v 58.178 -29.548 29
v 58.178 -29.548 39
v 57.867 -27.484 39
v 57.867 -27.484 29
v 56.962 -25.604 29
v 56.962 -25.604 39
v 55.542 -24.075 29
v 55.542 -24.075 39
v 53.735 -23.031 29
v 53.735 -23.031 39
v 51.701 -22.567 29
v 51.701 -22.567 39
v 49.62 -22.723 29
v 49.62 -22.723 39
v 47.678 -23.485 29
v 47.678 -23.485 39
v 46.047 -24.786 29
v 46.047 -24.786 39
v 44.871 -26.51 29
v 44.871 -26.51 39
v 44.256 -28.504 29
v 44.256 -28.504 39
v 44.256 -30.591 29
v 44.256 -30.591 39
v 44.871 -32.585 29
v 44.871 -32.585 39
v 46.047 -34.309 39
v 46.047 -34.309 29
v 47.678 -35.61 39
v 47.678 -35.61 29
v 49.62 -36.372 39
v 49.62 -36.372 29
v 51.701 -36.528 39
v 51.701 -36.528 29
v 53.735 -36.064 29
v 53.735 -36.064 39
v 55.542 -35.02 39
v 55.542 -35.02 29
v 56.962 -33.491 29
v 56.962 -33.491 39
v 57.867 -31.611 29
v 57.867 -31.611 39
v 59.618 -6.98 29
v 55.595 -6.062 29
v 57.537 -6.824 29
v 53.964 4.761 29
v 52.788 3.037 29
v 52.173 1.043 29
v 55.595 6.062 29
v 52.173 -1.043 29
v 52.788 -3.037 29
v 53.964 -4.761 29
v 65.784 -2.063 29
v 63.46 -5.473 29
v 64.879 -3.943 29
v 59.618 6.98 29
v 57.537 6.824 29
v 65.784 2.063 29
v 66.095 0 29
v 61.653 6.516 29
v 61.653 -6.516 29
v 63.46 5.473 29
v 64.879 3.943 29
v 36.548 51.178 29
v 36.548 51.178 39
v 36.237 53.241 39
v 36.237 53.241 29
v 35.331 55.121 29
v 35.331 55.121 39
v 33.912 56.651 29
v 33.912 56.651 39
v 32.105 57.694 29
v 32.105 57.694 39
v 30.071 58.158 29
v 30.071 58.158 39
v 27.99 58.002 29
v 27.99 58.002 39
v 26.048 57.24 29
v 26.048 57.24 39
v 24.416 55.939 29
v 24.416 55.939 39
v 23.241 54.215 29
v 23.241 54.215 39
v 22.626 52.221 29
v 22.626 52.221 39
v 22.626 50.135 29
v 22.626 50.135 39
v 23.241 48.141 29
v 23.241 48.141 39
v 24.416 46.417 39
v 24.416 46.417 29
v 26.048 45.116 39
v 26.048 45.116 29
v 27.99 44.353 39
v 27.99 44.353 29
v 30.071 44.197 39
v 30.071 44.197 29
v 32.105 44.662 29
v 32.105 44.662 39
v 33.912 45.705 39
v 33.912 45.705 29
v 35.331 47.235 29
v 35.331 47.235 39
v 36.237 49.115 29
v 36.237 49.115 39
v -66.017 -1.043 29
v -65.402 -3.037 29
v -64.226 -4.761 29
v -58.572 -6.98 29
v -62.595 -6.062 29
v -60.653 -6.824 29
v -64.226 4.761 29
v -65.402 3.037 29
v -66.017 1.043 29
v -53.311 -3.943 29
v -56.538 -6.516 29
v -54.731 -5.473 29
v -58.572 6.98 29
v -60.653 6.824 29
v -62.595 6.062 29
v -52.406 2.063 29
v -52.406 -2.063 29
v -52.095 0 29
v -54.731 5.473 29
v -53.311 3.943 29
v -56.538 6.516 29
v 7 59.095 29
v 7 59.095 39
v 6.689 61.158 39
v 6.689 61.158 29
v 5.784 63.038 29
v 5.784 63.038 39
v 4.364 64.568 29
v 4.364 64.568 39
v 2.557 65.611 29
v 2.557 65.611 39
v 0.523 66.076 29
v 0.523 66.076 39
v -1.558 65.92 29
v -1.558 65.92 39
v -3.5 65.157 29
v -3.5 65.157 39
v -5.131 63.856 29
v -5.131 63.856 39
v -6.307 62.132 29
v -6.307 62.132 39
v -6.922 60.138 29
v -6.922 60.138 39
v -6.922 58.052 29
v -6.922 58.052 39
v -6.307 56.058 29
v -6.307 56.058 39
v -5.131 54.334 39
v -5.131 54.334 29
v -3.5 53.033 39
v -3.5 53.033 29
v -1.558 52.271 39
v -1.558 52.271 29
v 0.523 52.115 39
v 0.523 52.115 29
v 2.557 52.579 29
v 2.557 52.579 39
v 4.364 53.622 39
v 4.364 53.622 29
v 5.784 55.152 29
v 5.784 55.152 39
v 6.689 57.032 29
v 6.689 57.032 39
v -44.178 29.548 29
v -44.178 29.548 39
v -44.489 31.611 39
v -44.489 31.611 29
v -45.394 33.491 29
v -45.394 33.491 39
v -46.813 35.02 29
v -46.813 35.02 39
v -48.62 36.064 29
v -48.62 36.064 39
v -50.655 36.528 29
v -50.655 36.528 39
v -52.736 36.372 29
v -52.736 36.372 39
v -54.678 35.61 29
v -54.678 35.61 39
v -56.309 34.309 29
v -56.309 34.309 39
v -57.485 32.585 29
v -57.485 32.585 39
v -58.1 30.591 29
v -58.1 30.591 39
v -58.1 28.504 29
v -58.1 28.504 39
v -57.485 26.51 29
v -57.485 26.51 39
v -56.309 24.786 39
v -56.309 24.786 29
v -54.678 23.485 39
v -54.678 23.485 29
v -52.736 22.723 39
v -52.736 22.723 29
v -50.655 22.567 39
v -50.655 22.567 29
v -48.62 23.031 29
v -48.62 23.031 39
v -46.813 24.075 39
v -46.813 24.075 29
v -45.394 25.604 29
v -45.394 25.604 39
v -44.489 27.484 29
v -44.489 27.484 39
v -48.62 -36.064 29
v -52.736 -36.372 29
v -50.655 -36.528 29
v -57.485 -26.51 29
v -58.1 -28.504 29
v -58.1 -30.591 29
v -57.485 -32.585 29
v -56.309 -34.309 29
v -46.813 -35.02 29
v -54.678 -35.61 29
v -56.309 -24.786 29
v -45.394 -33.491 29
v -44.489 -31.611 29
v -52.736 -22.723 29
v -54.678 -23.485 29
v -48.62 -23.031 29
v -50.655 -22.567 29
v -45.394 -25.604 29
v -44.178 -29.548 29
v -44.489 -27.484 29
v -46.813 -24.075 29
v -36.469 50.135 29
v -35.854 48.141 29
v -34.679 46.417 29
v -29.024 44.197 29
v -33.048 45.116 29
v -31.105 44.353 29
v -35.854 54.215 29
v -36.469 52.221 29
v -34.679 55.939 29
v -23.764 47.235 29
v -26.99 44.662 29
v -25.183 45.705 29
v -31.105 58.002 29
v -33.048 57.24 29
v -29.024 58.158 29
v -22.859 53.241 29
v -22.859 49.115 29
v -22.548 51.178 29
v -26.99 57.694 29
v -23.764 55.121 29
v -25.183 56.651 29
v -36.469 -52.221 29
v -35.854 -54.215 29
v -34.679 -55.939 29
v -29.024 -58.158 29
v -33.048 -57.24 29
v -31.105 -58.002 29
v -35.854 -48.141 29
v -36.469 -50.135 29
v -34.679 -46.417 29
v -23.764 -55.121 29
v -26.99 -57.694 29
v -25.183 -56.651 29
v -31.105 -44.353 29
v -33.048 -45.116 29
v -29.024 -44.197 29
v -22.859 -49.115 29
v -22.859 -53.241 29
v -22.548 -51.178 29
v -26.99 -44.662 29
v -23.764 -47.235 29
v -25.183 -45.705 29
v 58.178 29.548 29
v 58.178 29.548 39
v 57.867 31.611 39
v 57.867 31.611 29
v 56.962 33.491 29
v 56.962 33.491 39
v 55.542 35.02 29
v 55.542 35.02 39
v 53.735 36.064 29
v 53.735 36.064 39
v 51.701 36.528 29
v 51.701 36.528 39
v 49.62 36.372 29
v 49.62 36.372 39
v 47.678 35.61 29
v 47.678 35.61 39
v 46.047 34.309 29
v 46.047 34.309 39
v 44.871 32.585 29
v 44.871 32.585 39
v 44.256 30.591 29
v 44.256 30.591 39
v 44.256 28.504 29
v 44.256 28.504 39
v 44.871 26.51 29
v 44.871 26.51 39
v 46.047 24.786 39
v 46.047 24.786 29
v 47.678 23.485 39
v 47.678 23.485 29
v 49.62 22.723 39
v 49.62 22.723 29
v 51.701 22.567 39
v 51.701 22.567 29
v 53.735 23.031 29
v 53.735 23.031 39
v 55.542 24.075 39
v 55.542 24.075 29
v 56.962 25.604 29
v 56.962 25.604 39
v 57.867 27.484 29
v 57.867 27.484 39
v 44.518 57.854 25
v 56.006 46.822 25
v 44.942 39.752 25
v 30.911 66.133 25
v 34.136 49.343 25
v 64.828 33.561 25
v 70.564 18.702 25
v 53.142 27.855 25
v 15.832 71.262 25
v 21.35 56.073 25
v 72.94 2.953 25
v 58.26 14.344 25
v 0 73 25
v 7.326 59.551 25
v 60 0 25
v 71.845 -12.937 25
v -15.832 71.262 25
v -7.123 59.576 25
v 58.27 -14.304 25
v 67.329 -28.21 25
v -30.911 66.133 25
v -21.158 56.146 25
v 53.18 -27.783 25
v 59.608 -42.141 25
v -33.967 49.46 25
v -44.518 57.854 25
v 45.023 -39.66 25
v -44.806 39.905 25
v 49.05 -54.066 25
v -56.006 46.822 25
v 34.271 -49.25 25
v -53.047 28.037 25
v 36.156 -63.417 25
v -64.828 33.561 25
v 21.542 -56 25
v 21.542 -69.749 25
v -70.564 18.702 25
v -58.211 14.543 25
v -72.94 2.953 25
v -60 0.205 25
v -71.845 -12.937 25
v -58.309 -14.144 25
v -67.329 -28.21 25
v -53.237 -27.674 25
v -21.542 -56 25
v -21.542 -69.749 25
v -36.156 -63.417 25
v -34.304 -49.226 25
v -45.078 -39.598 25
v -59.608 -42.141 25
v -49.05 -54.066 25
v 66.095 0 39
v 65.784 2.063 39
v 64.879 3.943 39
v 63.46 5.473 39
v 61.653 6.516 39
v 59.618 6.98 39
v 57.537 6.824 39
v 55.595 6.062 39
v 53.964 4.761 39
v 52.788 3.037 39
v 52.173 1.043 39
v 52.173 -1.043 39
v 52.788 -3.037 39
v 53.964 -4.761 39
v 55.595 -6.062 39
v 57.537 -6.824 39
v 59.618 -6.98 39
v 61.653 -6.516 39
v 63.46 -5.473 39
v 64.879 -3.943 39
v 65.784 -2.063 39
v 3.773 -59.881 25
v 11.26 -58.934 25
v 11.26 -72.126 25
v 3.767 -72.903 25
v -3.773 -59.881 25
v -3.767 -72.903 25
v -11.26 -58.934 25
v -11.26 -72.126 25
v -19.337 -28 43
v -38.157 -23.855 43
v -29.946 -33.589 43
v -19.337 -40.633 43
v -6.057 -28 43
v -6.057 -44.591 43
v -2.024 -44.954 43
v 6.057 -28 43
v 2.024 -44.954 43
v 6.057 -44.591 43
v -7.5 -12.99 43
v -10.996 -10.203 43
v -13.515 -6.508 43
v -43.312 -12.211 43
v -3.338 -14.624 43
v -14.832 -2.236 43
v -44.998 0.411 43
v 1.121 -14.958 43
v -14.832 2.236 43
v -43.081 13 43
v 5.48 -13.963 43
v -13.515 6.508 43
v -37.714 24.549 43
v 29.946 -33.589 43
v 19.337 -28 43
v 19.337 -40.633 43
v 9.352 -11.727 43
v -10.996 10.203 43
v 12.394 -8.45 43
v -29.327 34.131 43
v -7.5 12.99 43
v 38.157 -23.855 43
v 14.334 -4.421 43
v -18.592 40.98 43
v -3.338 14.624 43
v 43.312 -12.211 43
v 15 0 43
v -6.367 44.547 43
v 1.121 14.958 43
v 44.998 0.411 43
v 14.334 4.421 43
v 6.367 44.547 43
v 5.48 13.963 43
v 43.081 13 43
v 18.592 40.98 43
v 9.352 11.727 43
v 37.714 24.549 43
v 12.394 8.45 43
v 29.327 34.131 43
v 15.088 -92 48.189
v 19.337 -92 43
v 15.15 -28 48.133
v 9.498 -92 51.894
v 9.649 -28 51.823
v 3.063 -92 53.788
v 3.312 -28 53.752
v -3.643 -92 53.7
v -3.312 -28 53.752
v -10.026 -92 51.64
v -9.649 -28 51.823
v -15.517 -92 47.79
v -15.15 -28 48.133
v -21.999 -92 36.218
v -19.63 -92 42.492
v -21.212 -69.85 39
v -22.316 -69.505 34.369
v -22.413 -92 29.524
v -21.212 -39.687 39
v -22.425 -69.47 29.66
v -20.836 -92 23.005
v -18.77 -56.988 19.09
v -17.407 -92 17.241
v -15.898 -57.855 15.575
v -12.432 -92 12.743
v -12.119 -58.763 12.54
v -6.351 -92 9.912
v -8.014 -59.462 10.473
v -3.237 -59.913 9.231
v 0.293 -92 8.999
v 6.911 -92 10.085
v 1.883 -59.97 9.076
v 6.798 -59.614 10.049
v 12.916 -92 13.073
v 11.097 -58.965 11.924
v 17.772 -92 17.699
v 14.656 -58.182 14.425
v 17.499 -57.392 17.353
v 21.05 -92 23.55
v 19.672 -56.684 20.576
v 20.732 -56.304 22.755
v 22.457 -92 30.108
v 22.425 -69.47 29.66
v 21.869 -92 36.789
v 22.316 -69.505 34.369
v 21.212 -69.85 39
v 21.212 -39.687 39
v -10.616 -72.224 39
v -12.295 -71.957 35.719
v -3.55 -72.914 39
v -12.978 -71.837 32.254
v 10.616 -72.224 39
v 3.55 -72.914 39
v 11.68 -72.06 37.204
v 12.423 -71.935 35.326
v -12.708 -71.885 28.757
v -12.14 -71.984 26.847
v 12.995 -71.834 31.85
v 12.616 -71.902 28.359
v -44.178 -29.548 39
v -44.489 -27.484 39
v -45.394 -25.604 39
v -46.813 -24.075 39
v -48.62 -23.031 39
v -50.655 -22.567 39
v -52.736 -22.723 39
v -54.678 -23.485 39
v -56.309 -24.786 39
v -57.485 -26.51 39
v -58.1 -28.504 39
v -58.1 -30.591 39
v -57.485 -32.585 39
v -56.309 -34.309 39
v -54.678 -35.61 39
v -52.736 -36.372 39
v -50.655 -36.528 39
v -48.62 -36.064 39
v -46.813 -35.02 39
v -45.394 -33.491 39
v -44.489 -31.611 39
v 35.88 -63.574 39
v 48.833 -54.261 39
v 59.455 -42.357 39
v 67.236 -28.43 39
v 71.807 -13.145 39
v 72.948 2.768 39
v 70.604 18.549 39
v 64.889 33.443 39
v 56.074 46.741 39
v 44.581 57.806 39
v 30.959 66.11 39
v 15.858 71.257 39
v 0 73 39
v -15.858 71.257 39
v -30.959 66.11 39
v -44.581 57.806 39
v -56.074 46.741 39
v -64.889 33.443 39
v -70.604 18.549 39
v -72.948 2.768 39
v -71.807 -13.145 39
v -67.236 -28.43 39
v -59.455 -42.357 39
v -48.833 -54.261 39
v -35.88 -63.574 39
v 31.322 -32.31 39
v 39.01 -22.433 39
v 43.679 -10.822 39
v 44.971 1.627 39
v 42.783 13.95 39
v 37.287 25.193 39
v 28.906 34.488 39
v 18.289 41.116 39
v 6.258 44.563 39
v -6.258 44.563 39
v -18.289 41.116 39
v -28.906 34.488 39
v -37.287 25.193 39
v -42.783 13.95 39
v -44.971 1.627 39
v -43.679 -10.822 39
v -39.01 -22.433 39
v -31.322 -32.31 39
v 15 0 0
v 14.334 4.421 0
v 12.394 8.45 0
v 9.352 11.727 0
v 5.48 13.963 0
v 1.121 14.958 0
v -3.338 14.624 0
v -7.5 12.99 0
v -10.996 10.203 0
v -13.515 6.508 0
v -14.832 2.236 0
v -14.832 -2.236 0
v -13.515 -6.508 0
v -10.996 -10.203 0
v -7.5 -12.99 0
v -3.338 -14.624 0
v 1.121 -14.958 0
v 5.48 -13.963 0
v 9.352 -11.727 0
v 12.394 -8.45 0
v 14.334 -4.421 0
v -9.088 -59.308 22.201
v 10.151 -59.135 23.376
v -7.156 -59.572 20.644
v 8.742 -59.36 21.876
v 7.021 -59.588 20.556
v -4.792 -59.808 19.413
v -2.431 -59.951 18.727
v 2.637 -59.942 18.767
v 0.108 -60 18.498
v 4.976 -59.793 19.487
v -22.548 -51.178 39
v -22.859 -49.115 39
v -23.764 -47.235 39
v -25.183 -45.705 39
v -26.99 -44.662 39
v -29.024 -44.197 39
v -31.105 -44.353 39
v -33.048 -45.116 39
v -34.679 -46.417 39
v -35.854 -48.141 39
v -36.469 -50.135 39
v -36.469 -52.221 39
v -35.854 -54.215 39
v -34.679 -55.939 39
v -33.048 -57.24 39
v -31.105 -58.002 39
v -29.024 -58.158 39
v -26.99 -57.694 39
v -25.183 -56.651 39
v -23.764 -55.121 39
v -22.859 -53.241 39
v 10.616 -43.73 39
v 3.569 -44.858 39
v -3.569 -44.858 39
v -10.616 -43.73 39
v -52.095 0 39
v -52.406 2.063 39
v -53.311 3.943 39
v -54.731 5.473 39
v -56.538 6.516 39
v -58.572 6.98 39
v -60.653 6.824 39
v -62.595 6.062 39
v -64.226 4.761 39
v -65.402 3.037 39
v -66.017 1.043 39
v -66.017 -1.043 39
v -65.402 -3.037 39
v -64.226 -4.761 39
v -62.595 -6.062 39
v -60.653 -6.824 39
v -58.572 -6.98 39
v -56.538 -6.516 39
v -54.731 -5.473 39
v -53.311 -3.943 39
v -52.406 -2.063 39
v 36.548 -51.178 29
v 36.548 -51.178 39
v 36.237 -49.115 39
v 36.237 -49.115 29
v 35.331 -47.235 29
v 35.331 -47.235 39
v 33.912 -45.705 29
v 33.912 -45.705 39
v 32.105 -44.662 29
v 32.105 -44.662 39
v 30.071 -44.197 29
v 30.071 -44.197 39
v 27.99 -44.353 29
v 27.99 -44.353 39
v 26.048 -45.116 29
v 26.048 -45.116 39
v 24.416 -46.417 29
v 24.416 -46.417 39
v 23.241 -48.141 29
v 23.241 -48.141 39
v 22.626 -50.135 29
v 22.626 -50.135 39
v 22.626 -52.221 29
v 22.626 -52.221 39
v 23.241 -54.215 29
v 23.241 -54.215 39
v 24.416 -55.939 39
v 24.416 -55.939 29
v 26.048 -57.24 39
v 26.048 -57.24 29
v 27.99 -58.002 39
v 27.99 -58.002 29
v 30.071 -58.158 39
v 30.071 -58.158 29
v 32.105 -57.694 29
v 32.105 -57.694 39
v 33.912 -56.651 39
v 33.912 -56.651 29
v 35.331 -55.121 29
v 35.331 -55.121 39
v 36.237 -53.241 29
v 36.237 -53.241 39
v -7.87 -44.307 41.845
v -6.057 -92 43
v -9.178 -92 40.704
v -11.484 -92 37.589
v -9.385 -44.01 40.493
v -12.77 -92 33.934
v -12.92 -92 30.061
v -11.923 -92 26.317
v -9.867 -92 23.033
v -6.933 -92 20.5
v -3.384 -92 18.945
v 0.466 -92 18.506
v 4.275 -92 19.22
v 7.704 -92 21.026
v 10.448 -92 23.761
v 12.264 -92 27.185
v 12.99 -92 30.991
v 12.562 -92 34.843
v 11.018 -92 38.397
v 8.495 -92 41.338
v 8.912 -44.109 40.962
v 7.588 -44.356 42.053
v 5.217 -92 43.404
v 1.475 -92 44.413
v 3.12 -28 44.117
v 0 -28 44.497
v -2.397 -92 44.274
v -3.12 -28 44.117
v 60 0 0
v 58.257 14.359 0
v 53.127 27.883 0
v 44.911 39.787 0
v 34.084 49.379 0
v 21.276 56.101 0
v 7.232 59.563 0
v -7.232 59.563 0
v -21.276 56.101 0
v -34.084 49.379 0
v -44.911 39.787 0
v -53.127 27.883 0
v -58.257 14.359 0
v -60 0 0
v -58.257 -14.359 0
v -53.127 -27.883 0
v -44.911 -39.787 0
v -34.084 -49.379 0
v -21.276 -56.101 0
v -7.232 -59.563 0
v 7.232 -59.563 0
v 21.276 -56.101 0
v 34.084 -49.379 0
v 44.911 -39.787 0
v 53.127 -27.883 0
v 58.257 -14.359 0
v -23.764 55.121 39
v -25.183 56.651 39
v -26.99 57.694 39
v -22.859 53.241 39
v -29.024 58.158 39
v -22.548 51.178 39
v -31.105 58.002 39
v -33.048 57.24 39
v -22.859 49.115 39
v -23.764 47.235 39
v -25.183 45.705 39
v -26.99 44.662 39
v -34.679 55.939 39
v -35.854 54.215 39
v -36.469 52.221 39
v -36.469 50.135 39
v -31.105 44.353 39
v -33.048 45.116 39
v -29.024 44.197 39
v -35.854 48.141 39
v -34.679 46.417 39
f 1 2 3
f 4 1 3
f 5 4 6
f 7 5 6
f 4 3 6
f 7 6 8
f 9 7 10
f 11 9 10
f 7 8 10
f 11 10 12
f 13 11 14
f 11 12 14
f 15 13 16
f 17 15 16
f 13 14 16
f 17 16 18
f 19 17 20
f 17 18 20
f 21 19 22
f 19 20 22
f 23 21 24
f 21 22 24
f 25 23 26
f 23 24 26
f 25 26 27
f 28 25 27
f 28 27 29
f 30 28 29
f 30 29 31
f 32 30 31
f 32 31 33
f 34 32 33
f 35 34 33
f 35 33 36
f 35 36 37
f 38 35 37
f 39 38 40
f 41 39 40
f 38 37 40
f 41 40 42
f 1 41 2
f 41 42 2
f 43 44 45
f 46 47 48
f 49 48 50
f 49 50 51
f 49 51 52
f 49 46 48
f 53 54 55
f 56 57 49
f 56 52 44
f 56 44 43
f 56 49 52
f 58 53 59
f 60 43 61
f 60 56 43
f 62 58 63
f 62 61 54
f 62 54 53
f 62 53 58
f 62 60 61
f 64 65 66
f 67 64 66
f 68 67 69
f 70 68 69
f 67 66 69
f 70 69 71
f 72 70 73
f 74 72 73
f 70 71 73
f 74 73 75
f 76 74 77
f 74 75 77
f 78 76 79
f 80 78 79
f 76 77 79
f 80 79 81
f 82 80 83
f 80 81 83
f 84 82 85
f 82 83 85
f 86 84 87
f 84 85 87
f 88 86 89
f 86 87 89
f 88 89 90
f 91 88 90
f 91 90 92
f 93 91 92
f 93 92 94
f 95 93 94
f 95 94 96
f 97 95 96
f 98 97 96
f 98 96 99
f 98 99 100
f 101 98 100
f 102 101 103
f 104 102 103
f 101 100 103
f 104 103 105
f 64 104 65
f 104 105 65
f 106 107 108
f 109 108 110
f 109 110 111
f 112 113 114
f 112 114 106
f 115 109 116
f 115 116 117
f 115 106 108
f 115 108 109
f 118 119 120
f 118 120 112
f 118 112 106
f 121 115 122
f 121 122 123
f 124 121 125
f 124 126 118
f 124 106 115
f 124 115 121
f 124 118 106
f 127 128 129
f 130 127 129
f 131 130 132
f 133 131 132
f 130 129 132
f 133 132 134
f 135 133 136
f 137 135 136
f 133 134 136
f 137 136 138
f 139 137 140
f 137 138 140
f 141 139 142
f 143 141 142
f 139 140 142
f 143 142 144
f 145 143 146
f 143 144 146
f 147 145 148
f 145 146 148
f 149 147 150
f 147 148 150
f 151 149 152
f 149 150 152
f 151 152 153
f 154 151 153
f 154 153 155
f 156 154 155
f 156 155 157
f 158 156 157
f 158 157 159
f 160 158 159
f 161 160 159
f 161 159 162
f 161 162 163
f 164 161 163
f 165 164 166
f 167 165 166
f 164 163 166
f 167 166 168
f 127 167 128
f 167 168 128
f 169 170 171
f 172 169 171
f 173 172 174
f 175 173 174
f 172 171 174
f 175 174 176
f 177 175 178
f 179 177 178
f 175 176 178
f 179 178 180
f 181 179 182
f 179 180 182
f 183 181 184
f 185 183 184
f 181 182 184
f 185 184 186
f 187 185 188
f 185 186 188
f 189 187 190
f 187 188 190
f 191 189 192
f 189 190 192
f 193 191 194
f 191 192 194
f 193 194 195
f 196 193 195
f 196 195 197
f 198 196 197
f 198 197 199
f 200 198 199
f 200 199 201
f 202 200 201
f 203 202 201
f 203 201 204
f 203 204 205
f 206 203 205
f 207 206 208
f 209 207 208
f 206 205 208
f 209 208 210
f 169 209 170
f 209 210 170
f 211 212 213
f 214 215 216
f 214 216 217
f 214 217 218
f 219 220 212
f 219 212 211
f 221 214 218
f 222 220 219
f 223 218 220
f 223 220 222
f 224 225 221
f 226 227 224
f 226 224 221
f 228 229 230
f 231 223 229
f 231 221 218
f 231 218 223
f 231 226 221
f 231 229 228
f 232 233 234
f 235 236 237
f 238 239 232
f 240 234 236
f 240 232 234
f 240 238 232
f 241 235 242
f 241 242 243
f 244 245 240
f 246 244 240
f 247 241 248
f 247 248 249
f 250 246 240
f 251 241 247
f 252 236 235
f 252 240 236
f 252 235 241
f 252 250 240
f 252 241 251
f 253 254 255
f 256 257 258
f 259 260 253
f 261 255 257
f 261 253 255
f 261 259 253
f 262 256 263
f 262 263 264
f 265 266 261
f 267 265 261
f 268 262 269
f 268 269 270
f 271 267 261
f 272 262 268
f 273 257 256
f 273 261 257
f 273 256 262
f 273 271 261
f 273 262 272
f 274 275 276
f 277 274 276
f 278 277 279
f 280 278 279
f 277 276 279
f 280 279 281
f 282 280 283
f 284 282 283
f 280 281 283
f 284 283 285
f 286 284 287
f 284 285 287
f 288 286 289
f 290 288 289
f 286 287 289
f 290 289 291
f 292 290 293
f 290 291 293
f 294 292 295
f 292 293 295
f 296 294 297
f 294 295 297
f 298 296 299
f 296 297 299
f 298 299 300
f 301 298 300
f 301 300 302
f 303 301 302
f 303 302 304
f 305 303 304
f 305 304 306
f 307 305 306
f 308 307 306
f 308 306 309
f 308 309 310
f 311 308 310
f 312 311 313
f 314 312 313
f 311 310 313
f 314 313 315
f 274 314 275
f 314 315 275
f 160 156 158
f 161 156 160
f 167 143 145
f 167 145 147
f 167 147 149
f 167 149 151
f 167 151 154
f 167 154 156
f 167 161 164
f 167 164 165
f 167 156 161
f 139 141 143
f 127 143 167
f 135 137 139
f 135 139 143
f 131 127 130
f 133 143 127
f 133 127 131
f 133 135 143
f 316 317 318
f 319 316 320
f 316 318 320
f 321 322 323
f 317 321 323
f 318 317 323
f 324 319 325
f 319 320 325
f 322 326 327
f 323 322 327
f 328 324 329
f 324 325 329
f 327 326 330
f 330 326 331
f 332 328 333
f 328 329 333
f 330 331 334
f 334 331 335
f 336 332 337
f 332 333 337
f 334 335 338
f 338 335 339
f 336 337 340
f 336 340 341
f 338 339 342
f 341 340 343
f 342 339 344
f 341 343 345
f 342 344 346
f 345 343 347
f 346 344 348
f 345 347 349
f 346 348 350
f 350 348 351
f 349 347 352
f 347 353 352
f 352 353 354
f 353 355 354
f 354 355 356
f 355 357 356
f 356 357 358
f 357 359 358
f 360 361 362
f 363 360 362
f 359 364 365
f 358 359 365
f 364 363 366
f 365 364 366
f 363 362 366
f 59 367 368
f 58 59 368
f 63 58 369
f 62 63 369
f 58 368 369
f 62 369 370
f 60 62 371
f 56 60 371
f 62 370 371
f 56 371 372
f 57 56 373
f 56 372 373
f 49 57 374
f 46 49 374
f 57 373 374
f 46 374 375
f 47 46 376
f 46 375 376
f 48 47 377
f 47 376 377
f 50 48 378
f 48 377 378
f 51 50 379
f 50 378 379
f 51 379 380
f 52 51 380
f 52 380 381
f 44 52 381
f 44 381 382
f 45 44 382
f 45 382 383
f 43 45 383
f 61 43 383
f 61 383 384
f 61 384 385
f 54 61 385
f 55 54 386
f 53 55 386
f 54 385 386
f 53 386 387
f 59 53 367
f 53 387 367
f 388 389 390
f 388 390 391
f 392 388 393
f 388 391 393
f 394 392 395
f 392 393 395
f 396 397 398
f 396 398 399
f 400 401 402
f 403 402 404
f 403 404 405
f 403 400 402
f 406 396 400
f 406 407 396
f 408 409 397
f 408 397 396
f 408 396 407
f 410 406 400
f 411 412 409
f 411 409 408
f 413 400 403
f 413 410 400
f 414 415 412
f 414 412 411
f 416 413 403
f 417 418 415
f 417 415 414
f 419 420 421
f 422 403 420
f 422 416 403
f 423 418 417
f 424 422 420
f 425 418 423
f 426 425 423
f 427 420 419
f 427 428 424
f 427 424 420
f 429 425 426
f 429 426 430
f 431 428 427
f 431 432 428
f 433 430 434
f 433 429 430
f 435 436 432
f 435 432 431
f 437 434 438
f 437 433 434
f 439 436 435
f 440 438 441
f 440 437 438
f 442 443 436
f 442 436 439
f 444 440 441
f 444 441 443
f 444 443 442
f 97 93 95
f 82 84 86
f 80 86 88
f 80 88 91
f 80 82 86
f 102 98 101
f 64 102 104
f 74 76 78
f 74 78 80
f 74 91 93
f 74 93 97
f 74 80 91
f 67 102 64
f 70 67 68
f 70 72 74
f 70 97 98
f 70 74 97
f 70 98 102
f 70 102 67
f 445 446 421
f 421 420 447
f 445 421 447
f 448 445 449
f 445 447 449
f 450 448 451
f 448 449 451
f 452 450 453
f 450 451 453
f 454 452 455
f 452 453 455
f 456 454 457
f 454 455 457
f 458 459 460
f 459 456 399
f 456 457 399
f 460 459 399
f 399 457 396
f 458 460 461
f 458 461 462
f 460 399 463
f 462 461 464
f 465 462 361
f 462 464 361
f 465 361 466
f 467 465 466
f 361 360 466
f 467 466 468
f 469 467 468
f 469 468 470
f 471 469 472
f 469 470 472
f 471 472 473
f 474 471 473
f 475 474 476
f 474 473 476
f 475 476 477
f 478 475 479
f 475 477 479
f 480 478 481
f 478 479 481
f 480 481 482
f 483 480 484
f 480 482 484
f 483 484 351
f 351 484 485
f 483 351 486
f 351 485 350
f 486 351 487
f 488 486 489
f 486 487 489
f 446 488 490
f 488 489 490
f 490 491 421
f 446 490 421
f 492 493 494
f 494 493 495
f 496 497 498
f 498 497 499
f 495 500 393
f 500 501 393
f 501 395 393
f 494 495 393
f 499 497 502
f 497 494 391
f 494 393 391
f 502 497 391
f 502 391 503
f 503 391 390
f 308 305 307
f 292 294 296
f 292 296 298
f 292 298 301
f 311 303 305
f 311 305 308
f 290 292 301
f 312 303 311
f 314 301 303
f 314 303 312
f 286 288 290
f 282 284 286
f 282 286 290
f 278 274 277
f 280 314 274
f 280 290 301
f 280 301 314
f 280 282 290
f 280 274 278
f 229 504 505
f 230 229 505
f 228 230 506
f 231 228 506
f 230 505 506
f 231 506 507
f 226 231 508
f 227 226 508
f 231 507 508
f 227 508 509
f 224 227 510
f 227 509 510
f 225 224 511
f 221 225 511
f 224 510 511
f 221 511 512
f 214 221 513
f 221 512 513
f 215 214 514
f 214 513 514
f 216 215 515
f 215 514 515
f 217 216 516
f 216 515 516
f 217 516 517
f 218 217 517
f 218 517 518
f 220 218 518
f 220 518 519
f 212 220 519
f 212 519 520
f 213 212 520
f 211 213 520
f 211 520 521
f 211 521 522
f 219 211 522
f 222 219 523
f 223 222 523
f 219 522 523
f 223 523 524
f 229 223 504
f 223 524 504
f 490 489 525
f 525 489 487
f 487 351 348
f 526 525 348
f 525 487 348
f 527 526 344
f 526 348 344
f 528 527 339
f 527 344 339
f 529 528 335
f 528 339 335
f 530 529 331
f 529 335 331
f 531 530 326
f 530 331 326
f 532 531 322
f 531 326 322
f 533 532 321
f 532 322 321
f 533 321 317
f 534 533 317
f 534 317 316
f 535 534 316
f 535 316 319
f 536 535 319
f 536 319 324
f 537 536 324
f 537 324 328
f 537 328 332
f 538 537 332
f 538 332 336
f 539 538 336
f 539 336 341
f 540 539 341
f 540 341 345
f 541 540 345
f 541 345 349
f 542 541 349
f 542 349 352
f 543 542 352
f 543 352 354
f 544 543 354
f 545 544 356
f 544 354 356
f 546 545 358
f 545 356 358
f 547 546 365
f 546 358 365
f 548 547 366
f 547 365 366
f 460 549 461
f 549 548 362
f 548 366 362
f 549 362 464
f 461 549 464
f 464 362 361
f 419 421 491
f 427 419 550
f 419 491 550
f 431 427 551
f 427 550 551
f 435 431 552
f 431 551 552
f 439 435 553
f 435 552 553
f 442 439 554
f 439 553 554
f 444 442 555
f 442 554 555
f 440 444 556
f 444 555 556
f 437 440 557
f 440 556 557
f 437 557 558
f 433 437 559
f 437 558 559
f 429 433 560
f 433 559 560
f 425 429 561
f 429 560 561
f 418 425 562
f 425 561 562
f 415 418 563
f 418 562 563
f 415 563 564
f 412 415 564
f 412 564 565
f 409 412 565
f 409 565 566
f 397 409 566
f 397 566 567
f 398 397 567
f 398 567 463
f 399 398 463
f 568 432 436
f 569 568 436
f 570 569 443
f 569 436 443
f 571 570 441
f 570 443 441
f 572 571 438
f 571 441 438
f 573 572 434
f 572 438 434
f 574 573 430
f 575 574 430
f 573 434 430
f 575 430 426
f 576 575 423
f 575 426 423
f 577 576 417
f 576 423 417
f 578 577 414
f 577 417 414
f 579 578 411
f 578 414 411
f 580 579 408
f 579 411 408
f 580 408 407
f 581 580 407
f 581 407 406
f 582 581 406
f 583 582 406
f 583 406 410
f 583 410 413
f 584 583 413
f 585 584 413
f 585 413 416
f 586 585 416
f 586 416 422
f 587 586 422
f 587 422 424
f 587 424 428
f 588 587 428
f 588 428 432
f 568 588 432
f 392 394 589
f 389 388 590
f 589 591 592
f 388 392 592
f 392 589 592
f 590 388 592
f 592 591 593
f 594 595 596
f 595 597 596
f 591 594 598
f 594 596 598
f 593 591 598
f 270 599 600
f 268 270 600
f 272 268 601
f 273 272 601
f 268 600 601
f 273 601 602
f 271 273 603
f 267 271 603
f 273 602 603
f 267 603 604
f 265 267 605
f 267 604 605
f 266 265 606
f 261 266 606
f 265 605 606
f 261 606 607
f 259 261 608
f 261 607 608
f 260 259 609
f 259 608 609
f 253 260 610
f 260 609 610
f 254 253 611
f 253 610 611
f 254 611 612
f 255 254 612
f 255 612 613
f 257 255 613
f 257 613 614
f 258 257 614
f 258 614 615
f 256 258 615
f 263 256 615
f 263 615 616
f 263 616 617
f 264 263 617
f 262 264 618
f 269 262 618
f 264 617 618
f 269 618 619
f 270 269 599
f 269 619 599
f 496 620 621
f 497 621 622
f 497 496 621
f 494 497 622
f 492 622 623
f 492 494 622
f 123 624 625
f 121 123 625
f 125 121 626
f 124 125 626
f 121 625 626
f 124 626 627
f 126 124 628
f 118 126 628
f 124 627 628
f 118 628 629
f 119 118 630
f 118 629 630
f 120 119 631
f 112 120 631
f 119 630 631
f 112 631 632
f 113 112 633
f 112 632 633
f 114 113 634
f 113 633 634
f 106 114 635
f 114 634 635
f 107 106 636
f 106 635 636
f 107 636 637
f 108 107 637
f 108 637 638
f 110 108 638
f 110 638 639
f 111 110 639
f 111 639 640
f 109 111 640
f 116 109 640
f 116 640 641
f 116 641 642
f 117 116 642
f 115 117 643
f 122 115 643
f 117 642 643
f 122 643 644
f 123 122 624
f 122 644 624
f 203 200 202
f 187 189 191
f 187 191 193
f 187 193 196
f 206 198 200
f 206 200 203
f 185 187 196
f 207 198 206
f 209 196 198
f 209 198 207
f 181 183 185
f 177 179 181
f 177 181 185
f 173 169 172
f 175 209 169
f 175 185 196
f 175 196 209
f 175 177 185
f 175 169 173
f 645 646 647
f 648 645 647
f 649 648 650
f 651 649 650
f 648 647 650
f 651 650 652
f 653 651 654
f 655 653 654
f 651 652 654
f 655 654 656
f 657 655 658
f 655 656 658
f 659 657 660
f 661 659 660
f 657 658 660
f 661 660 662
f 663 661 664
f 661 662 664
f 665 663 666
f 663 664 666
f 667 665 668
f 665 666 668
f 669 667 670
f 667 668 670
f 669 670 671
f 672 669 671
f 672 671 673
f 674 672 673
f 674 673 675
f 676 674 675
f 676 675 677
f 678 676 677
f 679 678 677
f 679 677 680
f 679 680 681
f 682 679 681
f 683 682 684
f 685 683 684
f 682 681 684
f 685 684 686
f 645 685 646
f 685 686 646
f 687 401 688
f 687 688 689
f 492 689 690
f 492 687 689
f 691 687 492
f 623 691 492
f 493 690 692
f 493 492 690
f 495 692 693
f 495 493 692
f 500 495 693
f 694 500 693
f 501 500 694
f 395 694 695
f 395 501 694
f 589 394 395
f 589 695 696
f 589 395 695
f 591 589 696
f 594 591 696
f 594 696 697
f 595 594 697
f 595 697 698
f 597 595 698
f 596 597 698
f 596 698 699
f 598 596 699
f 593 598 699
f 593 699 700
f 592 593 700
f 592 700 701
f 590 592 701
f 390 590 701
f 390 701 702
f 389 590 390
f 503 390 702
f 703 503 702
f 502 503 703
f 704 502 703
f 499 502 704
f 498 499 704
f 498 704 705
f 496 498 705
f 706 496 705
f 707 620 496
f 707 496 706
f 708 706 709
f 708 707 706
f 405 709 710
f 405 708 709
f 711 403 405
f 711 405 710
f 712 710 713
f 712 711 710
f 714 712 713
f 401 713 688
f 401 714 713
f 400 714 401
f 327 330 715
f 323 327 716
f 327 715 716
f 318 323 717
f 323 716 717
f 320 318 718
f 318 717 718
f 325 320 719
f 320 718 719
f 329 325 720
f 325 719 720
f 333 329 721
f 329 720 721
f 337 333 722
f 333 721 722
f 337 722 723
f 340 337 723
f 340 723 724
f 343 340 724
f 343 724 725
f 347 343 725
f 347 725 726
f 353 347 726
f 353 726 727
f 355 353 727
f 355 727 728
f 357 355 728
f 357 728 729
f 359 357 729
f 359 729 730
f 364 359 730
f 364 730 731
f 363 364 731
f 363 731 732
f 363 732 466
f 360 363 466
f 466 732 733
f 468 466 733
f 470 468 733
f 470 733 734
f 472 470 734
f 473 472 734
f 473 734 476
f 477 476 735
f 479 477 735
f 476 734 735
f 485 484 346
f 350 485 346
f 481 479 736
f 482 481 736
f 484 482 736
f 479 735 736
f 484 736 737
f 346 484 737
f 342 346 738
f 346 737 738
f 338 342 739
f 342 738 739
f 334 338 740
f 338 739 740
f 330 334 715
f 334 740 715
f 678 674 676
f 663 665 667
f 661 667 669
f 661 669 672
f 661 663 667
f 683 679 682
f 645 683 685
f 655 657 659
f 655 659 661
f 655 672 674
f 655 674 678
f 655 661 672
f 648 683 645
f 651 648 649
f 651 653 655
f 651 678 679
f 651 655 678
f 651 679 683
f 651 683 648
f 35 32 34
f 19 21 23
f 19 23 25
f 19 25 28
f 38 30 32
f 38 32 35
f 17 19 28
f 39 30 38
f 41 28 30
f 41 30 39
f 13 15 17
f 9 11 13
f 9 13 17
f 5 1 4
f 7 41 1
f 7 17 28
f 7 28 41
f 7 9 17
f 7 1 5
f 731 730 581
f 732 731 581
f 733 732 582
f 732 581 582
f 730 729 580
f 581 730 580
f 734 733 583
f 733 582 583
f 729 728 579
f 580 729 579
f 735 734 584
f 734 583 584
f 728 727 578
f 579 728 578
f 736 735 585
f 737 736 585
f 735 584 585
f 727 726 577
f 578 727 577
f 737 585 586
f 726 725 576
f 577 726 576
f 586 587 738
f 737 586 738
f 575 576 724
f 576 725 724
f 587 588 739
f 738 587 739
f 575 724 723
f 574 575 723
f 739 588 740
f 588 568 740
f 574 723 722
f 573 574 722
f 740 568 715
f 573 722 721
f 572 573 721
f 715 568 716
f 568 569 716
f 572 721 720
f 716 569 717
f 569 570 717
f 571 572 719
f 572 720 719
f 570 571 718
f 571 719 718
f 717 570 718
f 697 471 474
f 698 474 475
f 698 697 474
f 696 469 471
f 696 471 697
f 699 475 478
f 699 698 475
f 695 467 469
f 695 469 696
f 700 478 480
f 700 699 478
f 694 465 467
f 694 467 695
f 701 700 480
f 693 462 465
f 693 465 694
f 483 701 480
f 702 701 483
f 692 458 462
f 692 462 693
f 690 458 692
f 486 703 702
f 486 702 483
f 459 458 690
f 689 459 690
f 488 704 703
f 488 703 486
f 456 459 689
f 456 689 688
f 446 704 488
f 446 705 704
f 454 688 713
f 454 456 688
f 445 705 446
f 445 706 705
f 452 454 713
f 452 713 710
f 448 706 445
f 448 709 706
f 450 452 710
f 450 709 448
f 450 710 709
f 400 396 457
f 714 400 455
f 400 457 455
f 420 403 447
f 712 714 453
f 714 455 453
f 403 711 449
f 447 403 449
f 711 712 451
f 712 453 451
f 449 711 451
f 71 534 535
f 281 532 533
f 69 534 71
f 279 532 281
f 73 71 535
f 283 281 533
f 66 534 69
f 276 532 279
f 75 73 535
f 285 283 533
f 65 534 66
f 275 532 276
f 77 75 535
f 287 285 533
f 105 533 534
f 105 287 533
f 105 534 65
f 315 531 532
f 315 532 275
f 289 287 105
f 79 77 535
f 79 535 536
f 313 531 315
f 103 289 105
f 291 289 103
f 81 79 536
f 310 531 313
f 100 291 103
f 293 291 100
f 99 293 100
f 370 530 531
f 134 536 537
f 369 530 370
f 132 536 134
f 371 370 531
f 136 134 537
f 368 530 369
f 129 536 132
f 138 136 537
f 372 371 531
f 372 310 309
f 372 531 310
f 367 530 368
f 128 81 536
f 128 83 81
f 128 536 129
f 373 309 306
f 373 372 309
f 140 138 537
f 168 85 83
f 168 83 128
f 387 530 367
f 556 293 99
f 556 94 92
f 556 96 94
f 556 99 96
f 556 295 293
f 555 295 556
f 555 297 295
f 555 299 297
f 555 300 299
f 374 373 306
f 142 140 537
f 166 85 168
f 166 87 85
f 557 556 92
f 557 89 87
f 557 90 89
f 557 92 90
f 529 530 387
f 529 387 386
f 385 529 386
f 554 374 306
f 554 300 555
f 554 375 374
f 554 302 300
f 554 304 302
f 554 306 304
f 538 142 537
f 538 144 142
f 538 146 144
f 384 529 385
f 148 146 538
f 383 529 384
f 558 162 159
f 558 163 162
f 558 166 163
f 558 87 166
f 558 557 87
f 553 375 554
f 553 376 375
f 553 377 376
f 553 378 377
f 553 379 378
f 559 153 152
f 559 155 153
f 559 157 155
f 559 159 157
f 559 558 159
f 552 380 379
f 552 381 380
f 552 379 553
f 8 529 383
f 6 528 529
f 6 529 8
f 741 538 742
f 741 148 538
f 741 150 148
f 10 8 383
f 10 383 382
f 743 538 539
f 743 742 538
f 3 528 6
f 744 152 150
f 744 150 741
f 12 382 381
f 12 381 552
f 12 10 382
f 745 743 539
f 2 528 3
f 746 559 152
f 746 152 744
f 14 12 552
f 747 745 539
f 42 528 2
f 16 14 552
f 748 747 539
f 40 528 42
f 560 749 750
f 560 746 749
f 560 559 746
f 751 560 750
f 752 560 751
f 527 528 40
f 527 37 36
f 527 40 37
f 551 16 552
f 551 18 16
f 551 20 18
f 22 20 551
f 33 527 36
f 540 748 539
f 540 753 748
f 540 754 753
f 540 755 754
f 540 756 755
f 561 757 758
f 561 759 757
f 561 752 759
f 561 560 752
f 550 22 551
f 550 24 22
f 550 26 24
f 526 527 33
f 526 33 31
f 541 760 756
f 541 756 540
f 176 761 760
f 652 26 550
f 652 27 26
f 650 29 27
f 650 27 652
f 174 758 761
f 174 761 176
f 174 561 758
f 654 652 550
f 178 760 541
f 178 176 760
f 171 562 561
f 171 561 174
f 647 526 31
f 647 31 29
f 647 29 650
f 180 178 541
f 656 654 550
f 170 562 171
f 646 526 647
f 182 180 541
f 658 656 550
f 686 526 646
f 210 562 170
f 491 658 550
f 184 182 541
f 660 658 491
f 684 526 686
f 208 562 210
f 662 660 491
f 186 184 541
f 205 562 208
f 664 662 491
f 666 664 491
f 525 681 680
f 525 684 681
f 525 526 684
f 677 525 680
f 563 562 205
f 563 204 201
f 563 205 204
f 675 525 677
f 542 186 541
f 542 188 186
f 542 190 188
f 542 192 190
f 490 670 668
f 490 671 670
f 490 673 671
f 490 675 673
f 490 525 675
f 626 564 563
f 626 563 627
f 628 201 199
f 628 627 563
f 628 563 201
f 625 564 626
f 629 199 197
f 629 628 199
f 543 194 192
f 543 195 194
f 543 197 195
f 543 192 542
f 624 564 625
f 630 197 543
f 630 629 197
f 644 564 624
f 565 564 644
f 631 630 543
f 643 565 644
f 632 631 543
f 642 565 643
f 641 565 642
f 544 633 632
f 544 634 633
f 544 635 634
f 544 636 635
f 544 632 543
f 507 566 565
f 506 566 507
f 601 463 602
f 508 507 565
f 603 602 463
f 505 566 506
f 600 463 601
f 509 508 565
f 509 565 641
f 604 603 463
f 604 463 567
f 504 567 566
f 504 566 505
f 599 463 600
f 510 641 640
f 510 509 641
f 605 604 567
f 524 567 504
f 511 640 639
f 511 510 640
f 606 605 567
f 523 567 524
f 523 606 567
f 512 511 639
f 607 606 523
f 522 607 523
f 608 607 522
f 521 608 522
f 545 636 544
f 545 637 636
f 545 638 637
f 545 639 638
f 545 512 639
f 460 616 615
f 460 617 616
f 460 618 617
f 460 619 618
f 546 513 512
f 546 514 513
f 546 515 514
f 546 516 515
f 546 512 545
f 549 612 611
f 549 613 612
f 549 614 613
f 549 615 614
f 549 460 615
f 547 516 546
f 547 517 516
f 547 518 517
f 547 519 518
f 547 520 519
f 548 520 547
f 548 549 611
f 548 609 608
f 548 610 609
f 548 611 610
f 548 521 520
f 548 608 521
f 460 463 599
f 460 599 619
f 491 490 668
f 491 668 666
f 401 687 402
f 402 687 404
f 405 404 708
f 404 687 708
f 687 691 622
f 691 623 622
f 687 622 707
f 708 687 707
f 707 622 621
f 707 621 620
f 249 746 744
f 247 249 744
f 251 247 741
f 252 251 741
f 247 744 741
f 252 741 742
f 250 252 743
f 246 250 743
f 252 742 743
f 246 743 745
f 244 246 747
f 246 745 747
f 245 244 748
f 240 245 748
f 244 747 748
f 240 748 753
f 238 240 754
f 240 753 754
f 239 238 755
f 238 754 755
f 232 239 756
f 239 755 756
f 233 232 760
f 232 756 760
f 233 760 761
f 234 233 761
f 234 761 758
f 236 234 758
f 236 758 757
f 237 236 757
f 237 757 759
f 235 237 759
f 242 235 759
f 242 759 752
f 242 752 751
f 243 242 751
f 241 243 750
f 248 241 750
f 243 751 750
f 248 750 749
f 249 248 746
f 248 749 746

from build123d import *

# Parameters (mm, degrees)
SKETCH1_R                = 60
BOSS_EXTRUDE1_DEPTH      = 25
SKETCH2_R                = 73
BOSS_EXTRUDE2_DEPTH      = 14
SKETCH4_R                = 45
BOSS_EXTRUDE3_DEPTH      = 4
SKETCH5_R                = 15
CUT_EXTRUDE1_DEPTH       = 99
SKETCH6_R                = 7
CUT_EXTRUDE2_DEPTH       = 10
BOSS_EXTRUDE4_DEPTH      = 19
BOSS_EXTRUDE4_DEPTH_BACK = 45
SKETCH7_R                = 22.5
SKETCH7_R_2              = 13


with BuildPart() as part:
    # Sketch1 → Boss-Extrude1 (new body)
    with BuildSketch(Plane.XY):
        Circle(SKETCH1_R)
    extrude(amount=BOSS_EXTRUDE1_DEPTH)

    # Sketch2 → Boss-Extrude2 (add)
    with BuildSketch(Plane.XY.offset(25)):
        with Locations(Location((0, 0, 0), (0, 0, 180))):
            Circle(SKETCH2_R)
    extrude(amount=BOSS_EXTRUDE2_DEPTH)

    # Sketch4 → Boss-Extrude3 (add)
    with BuildSketch(Plane.XY.offset(39)):
        Circle(SKETCH4_R)
    extrude(amount=BOSS_EXTRUDE3_DEPTH)

    # Sketch5 → Cut-Extrude1 (cut)
    with BuildSketch(Plane.XY.offset(43)):
        Circle(SKETCH5_R)
    extrude(amount=-CUT_EXTRUDE1_DEPTH, mode=Mode.SUBTRACT)

    # Sketch6 → Cut-Extrude2 (cut)
    with BuildSketch(Plane.XY.offset(39)):
        with Locations((0, 59.095126961)):
            Circle(SKETCH6_R)
        with Locations((29.54756348, 51.177881188)):
            Circle(SKETCH6_R)
        with Locations((51.177881188, 29.54756348)):
            Circle(SKETCH6_R)
        with Locations((59.095126961, 0)):
            Circle(SKETCH6_R)
        with Locations((51.177881188, -29.54756348)):
            Circle(SKETCH6_R)
        with Locations((29.54756348, -51.177881188)):
            Circle(SKETCH6_R)
        with Locations((-29.54756348, -51.177881188)):
            Circle(SKETCH6_R)
        with Locations((-51.177881188, -29.54756348)):
            Circle(SKETCH6_R)
        with Locations((-59.095126961, 0)):
            Circle(SKETCH6_R)
        with Locations((-51.177881188, 29.54756348)):
            Circle(SKETCH6_R)
        with Locations((-29.54756348, 51.177881188)):
            Circle(SKETCH6_R)
    extrude(amount=-CUT_EXTRUDE2_DEPTH, mode=Mode.SUBTRACT)

    # Sketch7 → Boss-Extrude4 (add, two sides: drawn at the far end of the back side and taken through both)
    with BuildSketch(Plane(origin=(0, -73, 0), x_dir=(-1, 0, 0), z_dir=(0, -1, 0)).offset(-BOSS_EXTRUDE4_DEPTH_BACK)):
        with Locations(Location((0, -31.497185576, 0), (0, 0, 210.74620731))):
            Circle(SKETCH7_R)
        with Locations(Location((0, -31.497185576, 0), (0, 0, 297.769160661))):
            Circle(SKETCH7_R_2, mode=Mode.SUBTRACT)
    extrude(amount=BOSS_EXTRUDE4_DEPTH + BOSS_EXTRUDE4_DEPTH_BACK)


solid = part.part
